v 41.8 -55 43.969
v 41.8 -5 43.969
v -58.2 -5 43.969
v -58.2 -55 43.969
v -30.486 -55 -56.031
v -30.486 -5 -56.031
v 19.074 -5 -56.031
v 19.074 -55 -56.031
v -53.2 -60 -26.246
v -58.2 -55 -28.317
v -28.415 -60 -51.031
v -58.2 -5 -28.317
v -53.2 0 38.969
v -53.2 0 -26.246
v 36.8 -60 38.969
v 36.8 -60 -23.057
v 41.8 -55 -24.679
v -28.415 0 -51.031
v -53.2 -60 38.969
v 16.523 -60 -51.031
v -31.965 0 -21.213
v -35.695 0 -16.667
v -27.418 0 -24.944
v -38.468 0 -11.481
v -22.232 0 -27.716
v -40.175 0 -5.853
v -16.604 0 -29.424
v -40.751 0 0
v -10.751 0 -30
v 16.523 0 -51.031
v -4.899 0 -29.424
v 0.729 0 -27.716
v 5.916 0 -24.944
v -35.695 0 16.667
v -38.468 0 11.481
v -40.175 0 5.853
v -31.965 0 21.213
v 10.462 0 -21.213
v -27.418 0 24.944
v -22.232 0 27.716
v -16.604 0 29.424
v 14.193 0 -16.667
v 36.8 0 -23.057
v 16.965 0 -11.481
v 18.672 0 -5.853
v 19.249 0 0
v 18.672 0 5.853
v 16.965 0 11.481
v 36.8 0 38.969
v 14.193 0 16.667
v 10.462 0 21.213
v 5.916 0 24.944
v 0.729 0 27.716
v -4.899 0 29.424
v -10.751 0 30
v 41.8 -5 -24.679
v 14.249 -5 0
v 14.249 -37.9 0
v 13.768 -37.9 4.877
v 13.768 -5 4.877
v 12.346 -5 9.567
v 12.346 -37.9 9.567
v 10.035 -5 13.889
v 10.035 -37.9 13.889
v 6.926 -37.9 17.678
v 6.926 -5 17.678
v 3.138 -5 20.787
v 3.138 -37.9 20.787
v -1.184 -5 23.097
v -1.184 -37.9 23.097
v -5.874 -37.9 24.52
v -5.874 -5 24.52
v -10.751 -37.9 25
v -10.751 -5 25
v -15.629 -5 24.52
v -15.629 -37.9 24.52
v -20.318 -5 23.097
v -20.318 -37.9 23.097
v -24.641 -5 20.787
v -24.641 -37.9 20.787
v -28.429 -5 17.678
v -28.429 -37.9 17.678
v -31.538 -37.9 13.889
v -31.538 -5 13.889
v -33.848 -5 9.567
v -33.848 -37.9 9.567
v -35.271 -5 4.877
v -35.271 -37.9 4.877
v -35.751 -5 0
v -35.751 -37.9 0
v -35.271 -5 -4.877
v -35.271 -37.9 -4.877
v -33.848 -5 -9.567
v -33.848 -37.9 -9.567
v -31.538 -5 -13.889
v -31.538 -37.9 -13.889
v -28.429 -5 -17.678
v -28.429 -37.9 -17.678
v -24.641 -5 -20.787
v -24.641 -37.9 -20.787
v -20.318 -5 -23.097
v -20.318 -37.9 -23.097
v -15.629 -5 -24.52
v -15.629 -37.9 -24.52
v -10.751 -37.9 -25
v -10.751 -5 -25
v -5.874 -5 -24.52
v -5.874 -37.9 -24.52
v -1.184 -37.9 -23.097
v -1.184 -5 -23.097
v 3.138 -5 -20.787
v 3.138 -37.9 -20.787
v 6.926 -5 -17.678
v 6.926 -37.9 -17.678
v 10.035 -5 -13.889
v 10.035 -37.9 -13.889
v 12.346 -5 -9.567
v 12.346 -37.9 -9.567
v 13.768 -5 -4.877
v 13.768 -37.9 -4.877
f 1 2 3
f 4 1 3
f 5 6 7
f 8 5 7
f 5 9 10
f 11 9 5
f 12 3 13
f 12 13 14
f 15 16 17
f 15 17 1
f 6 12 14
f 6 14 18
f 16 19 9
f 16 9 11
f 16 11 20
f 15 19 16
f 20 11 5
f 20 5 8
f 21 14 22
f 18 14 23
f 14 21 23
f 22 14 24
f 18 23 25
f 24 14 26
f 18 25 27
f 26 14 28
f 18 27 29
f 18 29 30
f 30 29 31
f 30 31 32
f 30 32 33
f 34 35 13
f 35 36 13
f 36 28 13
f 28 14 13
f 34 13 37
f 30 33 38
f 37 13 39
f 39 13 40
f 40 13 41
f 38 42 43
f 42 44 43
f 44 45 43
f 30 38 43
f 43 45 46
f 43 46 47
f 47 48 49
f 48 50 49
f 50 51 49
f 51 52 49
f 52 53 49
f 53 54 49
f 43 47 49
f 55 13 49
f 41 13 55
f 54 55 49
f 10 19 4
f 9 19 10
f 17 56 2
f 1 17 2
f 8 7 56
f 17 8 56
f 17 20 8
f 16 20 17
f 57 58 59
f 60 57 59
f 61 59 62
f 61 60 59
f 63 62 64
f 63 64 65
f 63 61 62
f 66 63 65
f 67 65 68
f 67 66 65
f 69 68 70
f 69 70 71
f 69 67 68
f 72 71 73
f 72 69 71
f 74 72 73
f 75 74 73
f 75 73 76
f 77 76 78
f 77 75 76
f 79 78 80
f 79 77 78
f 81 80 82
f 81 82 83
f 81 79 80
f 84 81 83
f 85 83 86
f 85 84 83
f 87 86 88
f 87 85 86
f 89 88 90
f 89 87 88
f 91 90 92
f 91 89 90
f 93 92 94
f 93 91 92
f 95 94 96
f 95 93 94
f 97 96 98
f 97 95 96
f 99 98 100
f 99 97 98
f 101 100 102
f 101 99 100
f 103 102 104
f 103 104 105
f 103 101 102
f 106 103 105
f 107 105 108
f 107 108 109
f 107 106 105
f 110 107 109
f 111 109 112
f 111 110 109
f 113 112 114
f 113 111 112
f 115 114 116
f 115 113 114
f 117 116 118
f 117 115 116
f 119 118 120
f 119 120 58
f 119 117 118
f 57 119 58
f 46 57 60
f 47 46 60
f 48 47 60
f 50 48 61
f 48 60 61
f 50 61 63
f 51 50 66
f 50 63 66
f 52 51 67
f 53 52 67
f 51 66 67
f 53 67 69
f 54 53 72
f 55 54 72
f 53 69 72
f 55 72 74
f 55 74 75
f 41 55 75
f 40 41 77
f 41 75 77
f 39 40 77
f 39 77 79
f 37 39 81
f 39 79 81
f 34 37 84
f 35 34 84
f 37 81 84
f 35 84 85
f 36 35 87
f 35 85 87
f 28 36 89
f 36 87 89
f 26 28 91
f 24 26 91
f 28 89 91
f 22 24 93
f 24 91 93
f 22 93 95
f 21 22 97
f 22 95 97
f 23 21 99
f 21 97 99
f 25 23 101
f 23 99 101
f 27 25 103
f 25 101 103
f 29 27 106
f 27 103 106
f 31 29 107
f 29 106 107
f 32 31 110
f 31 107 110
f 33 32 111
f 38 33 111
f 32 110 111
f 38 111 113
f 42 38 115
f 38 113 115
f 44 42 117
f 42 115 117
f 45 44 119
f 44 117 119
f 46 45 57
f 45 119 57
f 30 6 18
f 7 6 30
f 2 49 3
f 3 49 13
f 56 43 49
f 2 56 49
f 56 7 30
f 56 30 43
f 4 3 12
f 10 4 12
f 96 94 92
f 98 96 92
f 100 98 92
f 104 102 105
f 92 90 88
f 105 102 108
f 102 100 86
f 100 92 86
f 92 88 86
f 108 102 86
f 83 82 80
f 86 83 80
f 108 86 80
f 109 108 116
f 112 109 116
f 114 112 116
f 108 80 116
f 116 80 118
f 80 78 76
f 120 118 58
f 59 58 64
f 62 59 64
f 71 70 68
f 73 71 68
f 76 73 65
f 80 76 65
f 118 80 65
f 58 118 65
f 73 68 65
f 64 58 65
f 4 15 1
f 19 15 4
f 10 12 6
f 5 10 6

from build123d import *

# Parameters (mm, degrees)
F1_DEPTH = 60
F2_SIZE  = 5
F3_R     = 25
F4_DEPTH = 25
F5_DEPTH = 25
F6_DEPTH = 37.9
F7_SIZE  = 5


with BuildPart() as f1:
    # F0 (on Front) → F1 (new body)
    with BuildSketch(Plane.XZ):
        Polygon((41.7999535799, 43.9688995481), (-58.2000464201, 43.9688995481), (-58.2000464201, -28.3167899087), (-30.4857346934, -56.0311004519), (19.0735861891, -56.0311004519), (41.7999535799, -24.6786684919), align=None)
    extrude(amount=F1_DEPTH)

    # F2
    f2_edges = [f1.edges().sort_by_distance(p)[0] for p in [
        (41.799954, -60, 9.645116),
        (-8.200046, -60, 43.9689),
        (-58.200046, -60, 7.826055),
        (-44.342891, -60, -42.173945),
        (-5.706074, -60, -56.0311),
        (30.43677, -60, -40.354884),
    ]]
    chamfer(f2_edges, length=F2_SIZE)

    # F3 (on Front) → F4 (cut)
    with BuildSketch(Plane.XZ):
        with Locations((-10.7513342236, 0)):
            Circle(F3_R)
    extrude(amount=-F4_DEPTH, mode=Mode.SUBTRACT)

    # F3 (on Front) → F5 (cut)
    with BuildSketch(Plane.XZ):
        with Locations((-10.7513342236, 0)):
            Circle(F3_R)
    extrude(amount=-F5_DEPTH, mode=Mode.SUBTRACT)

    # F3 (on Front) → F6 (cut)
    with BuildSketch(Plane.XZ):
        with Locations((-10.7513342236, 0)):
            Circle(F3_R)
    extrude(amount=F6_DEPTH, mode=Mode.SUBTRACT)

    # F7
    f7_edges = [f1.edges().sort_by_distance(p)[0] for p in [
        (41.799954, 0, 9.645116),
        (30.43677, 0, -40.354884),
        (-8.200046, 0, 43.9689),
        (-5.706074, 0, -56.0311),
        (-58.200046, 0, 7.826055),
        (-44.342891, 0, -42.173945),
        (-35.751334, 0, 0),
    ]]
    chamfer(f7_edges, length=F7_SIZE)


solid = f1.part
